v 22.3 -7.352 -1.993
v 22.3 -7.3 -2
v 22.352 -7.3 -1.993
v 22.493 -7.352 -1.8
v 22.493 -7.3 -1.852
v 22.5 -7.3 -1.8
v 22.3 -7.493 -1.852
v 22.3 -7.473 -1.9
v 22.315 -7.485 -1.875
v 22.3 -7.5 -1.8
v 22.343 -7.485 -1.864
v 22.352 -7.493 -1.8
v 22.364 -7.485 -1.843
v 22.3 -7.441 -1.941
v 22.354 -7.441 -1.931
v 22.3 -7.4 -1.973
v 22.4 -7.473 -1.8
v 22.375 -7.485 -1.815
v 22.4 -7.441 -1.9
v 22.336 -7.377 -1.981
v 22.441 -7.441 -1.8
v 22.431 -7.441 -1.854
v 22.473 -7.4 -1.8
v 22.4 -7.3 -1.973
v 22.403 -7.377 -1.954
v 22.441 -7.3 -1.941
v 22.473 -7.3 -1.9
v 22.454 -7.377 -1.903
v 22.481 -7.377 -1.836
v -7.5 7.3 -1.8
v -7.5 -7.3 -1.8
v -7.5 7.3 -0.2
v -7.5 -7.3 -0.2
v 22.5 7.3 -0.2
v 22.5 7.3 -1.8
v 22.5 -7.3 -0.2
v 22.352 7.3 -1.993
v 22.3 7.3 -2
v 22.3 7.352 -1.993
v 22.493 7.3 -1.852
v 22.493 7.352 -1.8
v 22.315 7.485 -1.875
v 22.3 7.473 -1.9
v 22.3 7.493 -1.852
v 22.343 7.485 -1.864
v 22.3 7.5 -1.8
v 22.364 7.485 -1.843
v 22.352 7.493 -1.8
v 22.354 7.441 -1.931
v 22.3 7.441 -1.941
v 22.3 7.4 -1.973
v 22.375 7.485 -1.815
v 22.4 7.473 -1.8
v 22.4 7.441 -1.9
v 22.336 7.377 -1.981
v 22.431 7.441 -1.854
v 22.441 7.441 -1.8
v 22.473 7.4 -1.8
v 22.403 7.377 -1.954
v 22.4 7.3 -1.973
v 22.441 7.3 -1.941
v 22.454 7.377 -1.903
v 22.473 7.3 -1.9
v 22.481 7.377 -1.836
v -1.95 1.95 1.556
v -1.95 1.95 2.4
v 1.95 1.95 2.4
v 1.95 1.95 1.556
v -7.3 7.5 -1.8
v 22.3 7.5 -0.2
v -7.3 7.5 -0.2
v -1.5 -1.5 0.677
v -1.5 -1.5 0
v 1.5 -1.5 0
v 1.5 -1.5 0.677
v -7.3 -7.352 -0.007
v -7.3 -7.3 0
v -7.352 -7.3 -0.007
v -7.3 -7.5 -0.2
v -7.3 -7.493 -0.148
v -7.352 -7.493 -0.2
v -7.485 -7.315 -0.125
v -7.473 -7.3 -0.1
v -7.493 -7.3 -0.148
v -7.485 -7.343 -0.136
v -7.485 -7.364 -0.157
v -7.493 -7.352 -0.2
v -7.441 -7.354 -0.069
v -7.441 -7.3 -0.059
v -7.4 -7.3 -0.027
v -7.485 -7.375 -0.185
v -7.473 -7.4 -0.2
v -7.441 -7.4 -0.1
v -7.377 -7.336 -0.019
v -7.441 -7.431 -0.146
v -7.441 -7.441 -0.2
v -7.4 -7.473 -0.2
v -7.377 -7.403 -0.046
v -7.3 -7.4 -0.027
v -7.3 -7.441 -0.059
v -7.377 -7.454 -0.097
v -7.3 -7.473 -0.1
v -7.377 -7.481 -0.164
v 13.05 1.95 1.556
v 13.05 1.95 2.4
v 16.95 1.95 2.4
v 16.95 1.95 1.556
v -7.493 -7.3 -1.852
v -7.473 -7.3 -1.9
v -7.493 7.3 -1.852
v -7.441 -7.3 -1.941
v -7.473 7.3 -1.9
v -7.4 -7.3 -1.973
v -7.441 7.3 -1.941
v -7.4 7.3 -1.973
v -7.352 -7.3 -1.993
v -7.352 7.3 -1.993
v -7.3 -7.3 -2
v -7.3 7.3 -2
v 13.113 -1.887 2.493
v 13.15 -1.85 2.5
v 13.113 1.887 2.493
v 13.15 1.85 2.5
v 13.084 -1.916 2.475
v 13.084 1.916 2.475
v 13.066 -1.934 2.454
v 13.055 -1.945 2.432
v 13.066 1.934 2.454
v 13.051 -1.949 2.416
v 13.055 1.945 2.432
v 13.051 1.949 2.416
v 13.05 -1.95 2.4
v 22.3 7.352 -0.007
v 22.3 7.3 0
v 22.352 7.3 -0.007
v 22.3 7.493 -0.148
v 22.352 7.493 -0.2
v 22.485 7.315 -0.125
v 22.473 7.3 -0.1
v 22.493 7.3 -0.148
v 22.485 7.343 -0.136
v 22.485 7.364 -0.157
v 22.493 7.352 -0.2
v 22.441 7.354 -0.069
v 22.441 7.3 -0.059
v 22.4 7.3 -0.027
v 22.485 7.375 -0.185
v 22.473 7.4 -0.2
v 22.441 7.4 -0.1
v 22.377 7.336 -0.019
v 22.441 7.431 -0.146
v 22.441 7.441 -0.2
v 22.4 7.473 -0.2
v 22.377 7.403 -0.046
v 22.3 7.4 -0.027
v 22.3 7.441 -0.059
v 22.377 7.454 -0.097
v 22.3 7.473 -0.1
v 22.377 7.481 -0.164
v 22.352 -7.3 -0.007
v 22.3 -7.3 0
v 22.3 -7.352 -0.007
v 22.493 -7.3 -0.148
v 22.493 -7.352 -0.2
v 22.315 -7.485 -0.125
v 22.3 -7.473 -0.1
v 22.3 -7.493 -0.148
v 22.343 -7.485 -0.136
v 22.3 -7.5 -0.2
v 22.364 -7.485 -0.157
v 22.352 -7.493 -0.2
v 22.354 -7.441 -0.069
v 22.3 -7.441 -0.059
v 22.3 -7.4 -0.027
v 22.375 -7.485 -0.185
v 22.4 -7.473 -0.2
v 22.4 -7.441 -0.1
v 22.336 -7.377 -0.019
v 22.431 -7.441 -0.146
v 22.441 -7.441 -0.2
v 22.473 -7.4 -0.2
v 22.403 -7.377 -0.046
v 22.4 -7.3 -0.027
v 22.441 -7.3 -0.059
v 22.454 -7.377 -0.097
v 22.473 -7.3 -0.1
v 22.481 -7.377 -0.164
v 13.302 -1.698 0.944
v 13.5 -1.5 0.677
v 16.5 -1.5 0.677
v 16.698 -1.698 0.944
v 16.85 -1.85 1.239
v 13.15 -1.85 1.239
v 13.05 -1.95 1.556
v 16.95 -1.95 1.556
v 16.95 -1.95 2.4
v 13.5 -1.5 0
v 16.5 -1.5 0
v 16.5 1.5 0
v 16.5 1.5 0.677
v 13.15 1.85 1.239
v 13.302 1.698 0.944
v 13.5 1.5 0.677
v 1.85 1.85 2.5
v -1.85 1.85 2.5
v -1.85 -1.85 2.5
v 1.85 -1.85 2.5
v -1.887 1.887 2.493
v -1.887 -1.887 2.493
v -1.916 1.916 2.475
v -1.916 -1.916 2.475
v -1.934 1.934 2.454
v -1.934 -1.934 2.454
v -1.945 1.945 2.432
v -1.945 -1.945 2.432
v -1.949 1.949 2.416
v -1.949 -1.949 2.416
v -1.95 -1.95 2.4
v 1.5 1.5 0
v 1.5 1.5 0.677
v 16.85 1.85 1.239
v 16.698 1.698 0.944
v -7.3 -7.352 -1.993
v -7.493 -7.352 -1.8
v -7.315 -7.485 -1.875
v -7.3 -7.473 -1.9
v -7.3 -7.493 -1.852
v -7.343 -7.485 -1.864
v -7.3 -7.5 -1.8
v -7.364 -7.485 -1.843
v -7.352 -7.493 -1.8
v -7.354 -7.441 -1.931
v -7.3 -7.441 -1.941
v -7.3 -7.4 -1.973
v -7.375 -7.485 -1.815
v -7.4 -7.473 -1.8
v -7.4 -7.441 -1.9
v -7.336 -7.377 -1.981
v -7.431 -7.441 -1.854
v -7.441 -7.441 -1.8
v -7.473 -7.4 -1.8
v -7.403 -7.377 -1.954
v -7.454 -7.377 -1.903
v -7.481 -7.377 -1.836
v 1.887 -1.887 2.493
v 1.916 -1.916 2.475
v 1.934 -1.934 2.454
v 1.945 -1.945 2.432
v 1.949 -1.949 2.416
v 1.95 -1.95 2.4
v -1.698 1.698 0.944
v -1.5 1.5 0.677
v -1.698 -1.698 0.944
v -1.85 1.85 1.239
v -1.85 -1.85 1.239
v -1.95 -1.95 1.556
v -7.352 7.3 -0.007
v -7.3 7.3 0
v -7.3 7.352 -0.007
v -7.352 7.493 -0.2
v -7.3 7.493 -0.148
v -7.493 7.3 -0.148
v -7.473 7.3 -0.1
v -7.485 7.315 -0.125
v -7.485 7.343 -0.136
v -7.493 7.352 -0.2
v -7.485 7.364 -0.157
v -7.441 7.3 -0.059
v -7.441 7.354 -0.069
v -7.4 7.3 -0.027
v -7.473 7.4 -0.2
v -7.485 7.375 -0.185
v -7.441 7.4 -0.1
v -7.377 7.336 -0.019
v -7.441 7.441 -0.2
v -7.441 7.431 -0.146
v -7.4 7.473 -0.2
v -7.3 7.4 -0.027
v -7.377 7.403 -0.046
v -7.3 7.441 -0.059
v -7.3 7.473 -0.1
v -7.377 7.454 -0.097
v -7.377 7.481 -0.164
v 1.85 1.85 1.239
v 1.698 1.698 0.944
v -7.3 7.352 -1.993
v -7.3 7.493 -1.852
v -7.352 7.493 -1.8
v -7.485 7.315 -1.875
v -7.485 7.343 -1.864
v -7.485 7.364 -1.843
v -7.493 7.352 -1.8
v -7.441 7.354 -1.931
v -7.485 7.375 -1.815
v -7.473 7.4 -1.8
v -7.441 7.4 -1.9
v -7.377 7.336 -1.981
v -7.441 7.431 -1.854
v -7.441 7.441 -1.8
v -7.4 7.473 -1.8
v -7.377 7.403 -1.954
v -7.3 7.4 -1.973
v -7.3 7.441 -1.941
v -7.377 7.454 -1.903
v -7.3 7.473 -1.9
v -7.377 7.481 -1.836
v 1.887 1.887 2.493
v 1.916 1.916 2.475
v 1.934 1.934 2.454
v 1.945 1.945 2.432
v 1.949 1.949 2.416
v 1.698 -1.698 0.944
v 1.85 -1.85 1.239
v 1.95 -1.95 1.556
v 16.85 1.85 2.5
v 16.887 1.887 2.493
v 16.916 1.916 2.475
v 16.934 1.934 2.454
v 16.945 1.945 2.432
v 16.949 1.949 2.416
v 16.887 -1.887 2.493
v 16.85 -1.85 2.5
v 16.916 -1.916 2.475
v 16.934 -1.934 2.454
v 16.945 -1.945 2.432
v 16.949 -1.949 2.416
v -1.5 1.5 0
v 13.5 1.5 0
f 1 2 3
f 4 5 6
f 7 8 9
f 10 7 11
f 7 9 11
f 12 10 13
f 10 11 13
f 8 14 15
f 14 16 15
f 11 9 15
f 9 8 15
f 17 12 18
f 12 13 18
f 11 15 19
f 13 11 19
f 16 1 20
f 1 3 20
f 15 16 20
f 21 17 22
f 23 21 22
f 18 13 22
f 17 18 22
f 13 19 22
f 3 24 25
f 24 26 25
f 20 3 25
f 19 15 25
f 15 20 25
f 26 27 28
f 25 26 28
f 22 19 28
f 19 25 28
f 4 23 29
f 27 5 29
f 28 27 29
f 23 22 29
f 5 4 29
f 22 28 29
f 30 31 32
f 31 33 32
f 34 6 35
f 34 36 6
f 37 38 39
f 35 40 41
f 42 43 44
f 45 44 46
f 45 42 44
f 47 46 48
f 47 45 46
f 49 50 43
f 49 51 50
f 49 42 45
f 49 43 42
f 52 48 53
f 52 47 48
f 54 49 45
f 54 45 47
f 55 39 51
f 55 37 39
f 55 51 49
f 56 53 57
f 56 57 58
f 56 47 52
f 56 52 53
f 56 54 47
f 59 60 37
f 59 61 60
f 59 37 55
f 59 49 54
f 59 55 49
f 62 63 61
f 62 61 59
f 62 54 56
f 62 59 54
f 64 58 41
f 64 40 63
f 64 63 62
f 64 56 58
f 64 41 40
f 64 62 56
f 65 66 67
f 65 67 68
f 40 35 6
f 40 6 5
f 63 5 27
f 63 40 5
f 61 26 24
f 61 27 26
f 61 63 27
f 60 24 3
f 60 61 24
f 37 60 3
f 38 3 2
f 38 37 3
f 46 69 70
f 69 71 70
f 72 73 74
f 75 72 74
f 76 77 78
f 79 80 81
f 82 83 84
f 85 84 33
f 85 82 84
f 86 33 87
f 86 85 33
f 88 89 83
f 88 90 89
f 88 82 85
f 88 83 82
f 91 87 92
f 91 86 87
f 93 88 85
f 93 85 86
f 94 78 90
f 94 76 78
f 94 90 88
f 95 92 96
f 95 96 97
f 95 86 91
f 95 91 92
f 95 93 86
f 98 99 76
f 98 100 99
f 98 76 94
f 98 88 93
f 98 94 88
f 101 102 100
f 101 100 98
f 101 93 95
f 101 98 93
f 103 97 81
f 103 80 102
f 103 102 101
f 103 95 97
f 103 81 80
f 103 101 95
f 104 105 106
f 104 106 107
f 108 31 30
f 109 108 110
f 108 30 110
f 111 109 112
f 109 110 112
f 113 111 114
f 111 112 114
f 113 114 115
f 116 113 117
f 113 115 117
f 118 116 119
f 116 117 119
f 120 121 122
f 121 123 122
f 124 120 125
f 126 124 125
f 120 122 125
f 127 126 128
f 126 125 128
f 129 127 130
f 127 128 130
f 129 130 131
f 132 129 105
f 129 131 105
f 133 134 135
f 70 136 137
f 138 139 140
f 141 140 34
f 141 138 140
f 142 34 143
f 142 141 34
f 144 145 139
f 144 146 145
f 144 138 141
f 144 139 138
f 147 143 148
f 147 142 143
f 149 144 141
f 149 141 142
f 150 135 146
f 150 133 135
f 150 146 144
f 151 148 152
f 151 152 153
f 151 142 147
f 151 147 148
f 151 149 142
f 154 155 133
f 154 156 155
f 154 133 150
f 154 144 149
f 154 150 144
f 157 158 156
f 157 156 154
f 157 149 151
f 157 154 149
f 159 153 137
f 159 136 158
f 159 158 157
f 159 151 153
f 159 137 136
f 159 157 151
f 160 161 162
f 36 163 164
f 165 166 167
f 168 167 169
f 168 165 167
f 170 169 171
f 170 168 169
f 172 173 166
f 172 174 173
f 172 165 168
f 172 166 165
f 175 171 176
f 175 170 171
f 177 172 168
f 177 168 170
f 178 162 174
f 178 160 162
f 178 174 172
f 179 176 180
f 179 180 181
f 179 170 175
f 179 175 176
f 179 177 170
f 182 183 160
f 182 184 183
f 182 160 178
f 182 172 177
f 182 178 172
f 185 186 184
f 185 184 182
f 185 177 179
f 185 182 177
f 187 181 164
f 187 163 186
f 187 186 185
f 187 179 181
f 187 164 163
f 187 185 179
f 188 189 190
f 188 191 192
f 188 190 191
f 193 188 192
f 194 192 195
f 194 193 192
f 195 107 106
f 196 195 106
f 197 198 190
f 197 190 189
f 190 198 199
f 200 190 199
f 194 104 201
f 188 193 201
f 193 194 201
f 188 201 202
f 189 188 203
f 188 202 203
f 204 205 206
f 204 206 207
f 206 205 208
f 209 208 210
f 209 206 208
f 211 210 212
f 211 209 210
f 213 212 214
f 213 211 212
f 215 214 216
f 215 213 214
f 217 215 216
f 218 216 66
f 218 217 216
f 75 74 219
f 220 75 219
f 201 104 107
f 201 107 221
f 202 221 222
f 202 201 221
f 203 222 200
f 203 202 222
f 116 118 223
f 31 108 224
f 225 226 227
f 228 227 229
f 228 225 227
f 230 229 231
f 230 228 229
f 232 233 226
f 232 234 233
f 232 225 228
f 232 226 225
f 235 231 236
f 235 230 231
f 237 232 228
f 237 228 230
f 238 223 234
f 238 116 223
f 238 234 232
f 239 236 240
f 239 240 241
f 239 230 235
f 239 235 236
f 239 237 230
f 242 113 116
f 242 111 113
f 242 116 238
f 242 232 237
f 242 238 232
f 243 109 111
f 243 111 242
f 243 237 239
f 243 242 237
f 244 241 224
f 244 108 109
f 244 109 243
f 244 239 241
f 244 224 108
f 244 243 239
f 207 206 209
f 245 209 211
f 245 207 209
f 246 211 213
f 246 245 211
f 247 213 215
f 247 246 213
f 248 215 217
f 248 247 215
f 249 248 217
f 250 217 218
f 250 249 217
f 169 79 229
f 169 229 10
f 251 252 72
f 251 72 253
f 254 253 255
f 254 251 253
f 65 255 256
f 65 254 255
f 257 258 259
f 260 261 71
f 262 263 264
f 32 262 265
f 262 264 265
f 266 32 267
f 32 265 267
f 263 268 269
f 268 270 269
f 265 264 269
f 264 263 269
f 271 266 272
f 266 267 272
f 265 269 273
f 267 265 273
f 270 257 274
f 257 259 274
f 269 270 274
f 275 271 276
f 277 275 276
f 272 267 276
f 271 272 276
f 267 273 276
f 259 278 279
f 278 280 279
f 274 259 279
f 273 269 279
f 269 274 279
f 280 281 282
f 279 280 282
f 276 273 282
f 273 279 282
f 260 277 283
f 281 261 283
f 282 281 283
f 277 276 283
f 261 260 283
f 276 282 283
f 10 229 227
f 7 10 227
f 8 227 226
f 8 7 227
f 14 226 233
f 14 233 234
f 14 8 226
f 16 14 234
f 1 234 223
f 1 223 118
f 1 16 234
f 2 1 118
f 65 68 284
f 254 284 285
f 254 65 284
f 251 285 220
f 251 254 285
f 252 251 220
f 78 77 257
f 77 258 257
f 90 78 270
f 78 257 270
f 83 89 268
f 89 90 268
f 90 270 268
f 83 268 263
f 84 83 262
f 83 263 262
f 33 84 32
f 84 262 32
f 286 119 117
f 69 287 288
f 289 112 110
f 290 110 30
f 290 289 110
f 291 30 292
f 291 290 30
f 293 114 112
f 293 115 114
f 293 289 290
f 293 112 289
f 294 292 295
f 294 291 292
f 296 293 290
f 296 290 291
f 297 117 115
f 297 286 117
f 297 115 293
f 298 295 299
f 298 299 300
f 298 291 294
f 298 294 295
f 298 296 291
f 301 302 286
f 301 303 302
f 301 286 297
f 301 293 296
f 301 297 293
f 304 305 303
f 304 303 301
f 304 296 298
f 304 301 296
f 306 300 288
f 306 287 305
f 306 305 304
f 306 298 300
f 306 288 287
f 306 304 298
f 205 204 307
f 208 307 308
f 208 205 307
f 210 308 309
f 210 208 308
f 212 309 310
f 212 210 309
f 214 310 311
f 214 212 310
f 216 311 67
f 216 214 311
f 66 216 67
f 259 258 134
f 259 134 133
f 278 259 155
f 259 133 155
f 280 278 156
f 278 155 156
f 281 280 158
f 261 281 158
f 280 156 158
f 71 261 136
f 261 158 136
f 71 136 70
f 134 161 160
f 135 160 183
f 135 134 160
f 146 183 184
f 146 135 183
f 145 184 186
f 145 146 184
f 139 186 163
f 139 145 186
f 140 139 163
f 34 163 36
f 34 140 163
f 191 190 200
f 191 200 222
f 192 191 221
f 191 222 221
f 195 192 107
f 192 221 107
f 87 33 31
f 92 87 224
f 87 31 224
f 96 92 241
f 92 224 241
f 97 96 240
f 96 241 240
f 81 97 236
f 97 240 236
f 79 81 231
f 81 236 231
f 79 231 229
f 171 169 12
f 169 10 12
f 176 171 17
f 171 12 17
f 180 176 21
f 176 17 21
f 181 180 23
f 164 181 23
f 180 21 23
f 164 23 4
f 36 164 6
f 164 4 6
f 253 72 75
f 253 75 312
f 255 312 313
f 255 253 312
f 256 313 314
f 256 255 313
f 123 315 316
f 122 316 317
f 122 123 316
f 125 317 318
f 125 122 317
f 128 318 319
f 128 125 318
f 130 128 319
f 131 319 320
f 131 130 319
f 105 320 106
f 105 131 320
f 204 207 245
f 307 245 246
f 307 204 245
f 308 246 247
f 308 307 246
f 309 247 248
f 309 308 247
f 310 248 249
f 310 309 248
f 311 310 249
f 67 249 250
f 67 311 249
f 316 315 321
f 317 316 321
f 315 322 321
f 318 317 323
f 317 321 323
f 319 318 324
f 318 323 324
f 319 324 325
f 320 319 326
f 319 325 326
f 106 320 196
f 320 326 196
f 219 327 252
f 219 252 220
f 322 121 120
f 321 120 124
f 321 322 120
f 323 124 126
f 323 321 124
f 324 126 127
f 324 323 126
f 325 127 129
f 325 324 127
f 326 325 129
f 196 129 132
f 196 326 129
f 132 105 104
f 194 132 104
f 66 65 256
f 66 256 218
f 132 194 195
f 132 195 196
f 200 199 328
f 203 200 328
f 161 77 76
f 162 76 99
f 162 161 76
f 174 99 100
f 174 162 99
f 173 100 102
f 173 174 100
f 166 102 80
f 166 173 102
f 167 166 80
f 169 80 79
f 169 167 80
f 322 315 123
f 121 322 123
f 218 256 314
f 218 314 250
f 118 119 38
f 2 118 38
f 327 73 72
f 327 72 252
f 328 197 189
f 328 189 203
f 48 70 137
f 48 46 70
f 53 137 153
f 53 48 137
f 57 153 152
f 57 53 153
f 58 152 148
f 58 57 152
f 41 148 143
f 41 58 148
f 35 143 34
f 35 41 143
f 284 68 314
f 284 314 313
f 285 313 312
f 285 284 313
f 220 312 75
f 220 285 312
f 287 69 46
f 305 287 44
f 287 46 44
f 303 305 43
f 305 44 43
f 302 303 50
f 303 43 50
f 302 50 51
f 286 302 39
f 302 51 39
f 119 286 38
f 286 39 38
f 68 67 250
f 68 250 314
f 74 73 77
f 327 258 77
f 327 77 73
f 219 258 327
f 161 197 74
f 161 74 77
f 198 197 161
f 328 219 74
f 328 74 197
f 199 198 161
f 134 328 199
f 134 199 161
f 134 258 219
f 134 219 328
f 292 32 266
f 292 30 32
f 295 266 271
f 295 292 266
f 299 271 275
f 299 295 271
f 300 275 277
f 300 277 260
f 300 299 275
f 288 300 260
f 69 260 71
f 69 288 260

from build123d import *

# Parameters (mm, degrees)
SKETCH_1_W                      = 30
SKETCH_1_H                      = 15
EXTRUDE_1_DEPTH                 = 2
SKETCH_2_W                      = 3
SKETCH_2_H                      = 3
EXTRUDE_2_DEPTH                 = 1
EXTRUDE_3_DEPTH                 = 2
CUT_EXTRUDE_1_REACH             = 25.848
CUT_EXTRUDE_1_DIRECTION_2_REACH = 25.848
FILLET_1_R                      = 0.1
FILLET_1_OF_MIRROR_1_R          = 0.1
FILLET_3_R                      = 0.2


with BuildPart() as part:
    # 草图1 → 凸台-拉伸1 (new body)
    with BuildSketch(Plane.XY):
        with Locations((7.5, 0)):
            Rectangle(SKETCH_1_W, SKETCH_1_H)
    extrude(amount=-EXTRUDE_1_DEPTH)

    # 草图2 → 凸台-拉伸2 (add)
    with BuildSketch(Plane.XY):
        Rectangle(SKETCH_2_W, SKETCH_2_H)
    extrude_2 = extrude(amount=EXTRUDE_2_DEPTH)

    # 草图3 → 凸台-拉伸3 (add, symmetric)
    with BuildSketch(Plane(origin=(0, 0, 0), x_dir=(1, 0, 0), z_dir=(0, 1, 0))):
        with BuildLine():
            Line((-1.95, -2.5), (1.95, -2.5))
            Line((1.95, -2.5), (1.95, -1.555590279))
            ThreePointArc((1.95, -1.555590279), (1.780042303, -1.088161527), (1.5, -0.677124344))
            Line((1.5, -0.677124344), (-1.5, -0.677124344))
            ThreePointArc((-1.5, -0.677124344), (-1.780042303, -1.088161527), (-1.95, -1.555590279))
            Line((-1.95, -1.555590279), (-1.95, -2.5))
        make_face()
    extrude_3 = extrude(amount=EXTRUDE_3_DEPTH, both=True)

    # 草图4 → 切除-拉伸1 (cut, up to next)
    with BuildSketch(Plane(origin=(0, 0, 0), x_dir=(0, 0, -1), z_dir=(1, 0, 0)), mode=Mode.PRIVATE) as cut_extrude_1_sk1:
        with BuildLine():
            Line((-2.5, 1.95), (-1.555590279, 1.95))
            ThreePointArc((-1.555590279, 1.95), (-1.088161527, 1.780042303), (-0.677124344, 1.5))
            Line((-0.677124344, 1.5), (-0.677124344, 2))
            Line((-0.677124344, 2), (-2.5, 2))
            Line((-2.5, 2), (-2.5, 1.95))
        make_face()
    cut_extrude_1_tool1 = extrude(cut_extrude_1_sk1.sketch, amount=-CUT_EXTRUDE_1_REACH, mode=Mode.PRIVATE) & part.part
    # 草图4 → 切除-拉伸1 (cut, up to next)
    with BuildSketch(Plane(origin=(0, 0, 0), x_dir=(0, 0, -1), z_dir=(1, 0, 0)), mode=Mode.PRIVATE) as cut_extrude_1_sk2:
        with BuildLine():
            Line((-2.5, -2), (-0.677124344, -2))
            Line((-0.677124344, -2), (-0.677124344, -1.5))
            ThreePointArc((-0.677124344, -1.5), (-1.088161527, -1.780042303), (-1.555590279, -1.95))
            Line((-1.555590279, -1.95), (-2.5, -1.95))
            Line((-2.5, -1.95), (-2.5, -2))
        make_face()
    cut_extrude_1_tool2 = extrude(cut_extrude_1_sk2.sketch, amount=-CUT_EXTRUDE_1_REACH, mode=Mode.PRIVATE) & part.part
    cut_extrude_1_1 = cut_extrude_1_tool1.solids().sort_by_distance((0, 1.873038, 1.175075))[0]
    add(cut_extrude_1_1, mode=Mode.SUBTRACT)
    cut_extrude_1_2 = cut_extrude_1_tool2.solids().sort_by_distance((0, -1.873038, 1.175075))[0]
    add(cut_extrude_1_2, mode=Mode.SUBTRACT)
    cut_extrude_1 = cut_extrude_1_1 + cut_extrude_1_2  # 切除-拉伸1 as one shape, for the pattern or mirror that repeats it

    # 草图4 → 切除-拉伸1 direction 2 (cut, up to next)
    with BuildSketch(Plane(origin=(0, 0, 0), x_dir=(0, 0, -1), z_dir=(1, 0, 0)), mode=Mode.PRIVATE) as cut_extrude_1_direction_2_sk1:
        with BuildLine():
            Line((-2.5, 1.95), (-1.555590279, 1.95))
            ThreePointArc((-1.555590279, 1.95), (-1.088161527, 1.780042303), (-0.677124344, 1.5))
            Line((-0.677124344, 1.5), (-0.677124344, 2))
            Line((-0.677124344, 2), (-2.5, 2))
            Line((-2.5, 2), (-2.5, 1.95))
        make_face()
    cut_extrude_1_direction_2_tool1 = extrude(cut_extrude_1_direction_2_sk1.sketch, amount=CUT_EXTRUDE_1_DIRECTION_2_REACH, mode=Mode.PRIVATE) & part.part
    # 草图4 → 切除-拉伸1 direction 2 (cut, up to next)
    with BuildSketch(Plane(origin=(0, 0, 0), x_dir=(0, 0, -1), z_dir=(1, 0, 0)), mode=Mode.PRIVATE) as cut_extrude_1_direction_2_sk2:
        with BuildLine():
            Line((-2.5, -2), (-0.677124344, -2))
            Line((-0.677124344, -2), (-0.677124344, -1.5))
            ThreePointArc((-0.677124344, -1.5), (-1.088161527, -1.780042303), (-1.555590279, -1.95))
            Line((-1.555590279, -1.95), (-2.5, -1.95))
            Line((-2.5, -1.95), (-2.5, -2))
        make_face()
    cut_extrude_1_direction_2_tool2 = extrude(cut_extrude_1_direction_2_sk2.sketch, amount=CUT_EXTRUDE_1_DIRECTION_2_REACH, mode=Mode.PRIVATE) & part.part
    cut_extrude_1_direction_2_1 = cut_extrude_1_direction_2_tool1.solids().sort_by_distance((0, 1.873038, 1.175075))[0]
    add(cut_extrude_1_direction_2_1, mode=Mode.SUBTRACT)
    cut_extrude_1_direction_2_2 = cut_extrude_1_direction_2_tool2.solids().sort_by_distance((0, -1.873038, 1.175075))[0]
    add(cut_extrude_1_direction_2_2, mode=Mode.SUBTRACT)
    cut_extrude_1_direction_2 = cut_extrude_1_direction_2_1 + cut_extrude_1_direction_2_2  # 切除-拉伸1 direction 2 as one shape, for the pattern or mirror that repeats it

    # 圆角1
    fillet_1_edges = [part.edges().sort_by_distance(p)[0] for p in [
        (-1.95, 0, 2.5),
        (1.95, 0, 2.5),
        (0, -1.95, 2.5),
        (0, 1.95, 2.5),
    ]]
    fillet(fillet_1_edges, radius=FILLET_1_R)

    # 镜向1: 凸台-拉伸2, 凸台-拉伸3, 切除-拉伸1, 切除-拉伸1 direction 2 across plane
    add(extrude_2.mirror(Plane(origin=(7.5, 0, 0), x_dir=(0, 0, 1), z_dir=(1, 0, 0))))
    add(extrude_3.mirror(Plane(origin=(7.5, 0, 0), x_dir=(0, 0, 1), z_dir=(1, 0, 0))))
    add(cut_extrude_1.mirror(Plane(origin=(7.5, 0, 0), x_dir=(0, 0, 1), z_dir=(1, 0, 0))), mode=Mode.SUBTRACT)
    add(cut_extrude_1_direction_2.mirror(Plane(origin=(7.5, 0, 0), x_dir=(0, 0, 1), z_dir=(1, 0, 0))), mode=Mode.SUBTRACT)

    # 圆角1 of 镜向1
    fillet_1_of_mirror_1_edges = [part.edges().sort_by_distance(p)[0] for p in [
        (16.95, 0, 2.5),
        (13.05, 0, 2.5),
        (15, -1.95, 2.5),
        (15, 1.95, 2.5),
    ]]
    fillet(fillet_1_of_mirror_1_edges, radius=FILLET_1_OF_MIRROR_1_R)

    # 圆角3
    fillet_3_edges = [part.edges().sort_by_distance(p)[0] for p in [
        (22.5, 0, -2),
        (7.5, 7.5, -2),
        (-7.5, 0, -2),
        (7.5, 7.5, 0),
        (22.5, 0, 0),
        (7.5, -7.5, 0),
        (-7.5, 0, 0),
        (7.5, -7.5, -2),
        (-7.5, 7.5, -1),
        (22.5, 7.5, -1),
        (22.5, -7.5, -1),
        (-7.5, -7.5, -1),
    ]]
    fillet(fillet_3_edges, radius=FILLET_3_R)


solid = part.part
